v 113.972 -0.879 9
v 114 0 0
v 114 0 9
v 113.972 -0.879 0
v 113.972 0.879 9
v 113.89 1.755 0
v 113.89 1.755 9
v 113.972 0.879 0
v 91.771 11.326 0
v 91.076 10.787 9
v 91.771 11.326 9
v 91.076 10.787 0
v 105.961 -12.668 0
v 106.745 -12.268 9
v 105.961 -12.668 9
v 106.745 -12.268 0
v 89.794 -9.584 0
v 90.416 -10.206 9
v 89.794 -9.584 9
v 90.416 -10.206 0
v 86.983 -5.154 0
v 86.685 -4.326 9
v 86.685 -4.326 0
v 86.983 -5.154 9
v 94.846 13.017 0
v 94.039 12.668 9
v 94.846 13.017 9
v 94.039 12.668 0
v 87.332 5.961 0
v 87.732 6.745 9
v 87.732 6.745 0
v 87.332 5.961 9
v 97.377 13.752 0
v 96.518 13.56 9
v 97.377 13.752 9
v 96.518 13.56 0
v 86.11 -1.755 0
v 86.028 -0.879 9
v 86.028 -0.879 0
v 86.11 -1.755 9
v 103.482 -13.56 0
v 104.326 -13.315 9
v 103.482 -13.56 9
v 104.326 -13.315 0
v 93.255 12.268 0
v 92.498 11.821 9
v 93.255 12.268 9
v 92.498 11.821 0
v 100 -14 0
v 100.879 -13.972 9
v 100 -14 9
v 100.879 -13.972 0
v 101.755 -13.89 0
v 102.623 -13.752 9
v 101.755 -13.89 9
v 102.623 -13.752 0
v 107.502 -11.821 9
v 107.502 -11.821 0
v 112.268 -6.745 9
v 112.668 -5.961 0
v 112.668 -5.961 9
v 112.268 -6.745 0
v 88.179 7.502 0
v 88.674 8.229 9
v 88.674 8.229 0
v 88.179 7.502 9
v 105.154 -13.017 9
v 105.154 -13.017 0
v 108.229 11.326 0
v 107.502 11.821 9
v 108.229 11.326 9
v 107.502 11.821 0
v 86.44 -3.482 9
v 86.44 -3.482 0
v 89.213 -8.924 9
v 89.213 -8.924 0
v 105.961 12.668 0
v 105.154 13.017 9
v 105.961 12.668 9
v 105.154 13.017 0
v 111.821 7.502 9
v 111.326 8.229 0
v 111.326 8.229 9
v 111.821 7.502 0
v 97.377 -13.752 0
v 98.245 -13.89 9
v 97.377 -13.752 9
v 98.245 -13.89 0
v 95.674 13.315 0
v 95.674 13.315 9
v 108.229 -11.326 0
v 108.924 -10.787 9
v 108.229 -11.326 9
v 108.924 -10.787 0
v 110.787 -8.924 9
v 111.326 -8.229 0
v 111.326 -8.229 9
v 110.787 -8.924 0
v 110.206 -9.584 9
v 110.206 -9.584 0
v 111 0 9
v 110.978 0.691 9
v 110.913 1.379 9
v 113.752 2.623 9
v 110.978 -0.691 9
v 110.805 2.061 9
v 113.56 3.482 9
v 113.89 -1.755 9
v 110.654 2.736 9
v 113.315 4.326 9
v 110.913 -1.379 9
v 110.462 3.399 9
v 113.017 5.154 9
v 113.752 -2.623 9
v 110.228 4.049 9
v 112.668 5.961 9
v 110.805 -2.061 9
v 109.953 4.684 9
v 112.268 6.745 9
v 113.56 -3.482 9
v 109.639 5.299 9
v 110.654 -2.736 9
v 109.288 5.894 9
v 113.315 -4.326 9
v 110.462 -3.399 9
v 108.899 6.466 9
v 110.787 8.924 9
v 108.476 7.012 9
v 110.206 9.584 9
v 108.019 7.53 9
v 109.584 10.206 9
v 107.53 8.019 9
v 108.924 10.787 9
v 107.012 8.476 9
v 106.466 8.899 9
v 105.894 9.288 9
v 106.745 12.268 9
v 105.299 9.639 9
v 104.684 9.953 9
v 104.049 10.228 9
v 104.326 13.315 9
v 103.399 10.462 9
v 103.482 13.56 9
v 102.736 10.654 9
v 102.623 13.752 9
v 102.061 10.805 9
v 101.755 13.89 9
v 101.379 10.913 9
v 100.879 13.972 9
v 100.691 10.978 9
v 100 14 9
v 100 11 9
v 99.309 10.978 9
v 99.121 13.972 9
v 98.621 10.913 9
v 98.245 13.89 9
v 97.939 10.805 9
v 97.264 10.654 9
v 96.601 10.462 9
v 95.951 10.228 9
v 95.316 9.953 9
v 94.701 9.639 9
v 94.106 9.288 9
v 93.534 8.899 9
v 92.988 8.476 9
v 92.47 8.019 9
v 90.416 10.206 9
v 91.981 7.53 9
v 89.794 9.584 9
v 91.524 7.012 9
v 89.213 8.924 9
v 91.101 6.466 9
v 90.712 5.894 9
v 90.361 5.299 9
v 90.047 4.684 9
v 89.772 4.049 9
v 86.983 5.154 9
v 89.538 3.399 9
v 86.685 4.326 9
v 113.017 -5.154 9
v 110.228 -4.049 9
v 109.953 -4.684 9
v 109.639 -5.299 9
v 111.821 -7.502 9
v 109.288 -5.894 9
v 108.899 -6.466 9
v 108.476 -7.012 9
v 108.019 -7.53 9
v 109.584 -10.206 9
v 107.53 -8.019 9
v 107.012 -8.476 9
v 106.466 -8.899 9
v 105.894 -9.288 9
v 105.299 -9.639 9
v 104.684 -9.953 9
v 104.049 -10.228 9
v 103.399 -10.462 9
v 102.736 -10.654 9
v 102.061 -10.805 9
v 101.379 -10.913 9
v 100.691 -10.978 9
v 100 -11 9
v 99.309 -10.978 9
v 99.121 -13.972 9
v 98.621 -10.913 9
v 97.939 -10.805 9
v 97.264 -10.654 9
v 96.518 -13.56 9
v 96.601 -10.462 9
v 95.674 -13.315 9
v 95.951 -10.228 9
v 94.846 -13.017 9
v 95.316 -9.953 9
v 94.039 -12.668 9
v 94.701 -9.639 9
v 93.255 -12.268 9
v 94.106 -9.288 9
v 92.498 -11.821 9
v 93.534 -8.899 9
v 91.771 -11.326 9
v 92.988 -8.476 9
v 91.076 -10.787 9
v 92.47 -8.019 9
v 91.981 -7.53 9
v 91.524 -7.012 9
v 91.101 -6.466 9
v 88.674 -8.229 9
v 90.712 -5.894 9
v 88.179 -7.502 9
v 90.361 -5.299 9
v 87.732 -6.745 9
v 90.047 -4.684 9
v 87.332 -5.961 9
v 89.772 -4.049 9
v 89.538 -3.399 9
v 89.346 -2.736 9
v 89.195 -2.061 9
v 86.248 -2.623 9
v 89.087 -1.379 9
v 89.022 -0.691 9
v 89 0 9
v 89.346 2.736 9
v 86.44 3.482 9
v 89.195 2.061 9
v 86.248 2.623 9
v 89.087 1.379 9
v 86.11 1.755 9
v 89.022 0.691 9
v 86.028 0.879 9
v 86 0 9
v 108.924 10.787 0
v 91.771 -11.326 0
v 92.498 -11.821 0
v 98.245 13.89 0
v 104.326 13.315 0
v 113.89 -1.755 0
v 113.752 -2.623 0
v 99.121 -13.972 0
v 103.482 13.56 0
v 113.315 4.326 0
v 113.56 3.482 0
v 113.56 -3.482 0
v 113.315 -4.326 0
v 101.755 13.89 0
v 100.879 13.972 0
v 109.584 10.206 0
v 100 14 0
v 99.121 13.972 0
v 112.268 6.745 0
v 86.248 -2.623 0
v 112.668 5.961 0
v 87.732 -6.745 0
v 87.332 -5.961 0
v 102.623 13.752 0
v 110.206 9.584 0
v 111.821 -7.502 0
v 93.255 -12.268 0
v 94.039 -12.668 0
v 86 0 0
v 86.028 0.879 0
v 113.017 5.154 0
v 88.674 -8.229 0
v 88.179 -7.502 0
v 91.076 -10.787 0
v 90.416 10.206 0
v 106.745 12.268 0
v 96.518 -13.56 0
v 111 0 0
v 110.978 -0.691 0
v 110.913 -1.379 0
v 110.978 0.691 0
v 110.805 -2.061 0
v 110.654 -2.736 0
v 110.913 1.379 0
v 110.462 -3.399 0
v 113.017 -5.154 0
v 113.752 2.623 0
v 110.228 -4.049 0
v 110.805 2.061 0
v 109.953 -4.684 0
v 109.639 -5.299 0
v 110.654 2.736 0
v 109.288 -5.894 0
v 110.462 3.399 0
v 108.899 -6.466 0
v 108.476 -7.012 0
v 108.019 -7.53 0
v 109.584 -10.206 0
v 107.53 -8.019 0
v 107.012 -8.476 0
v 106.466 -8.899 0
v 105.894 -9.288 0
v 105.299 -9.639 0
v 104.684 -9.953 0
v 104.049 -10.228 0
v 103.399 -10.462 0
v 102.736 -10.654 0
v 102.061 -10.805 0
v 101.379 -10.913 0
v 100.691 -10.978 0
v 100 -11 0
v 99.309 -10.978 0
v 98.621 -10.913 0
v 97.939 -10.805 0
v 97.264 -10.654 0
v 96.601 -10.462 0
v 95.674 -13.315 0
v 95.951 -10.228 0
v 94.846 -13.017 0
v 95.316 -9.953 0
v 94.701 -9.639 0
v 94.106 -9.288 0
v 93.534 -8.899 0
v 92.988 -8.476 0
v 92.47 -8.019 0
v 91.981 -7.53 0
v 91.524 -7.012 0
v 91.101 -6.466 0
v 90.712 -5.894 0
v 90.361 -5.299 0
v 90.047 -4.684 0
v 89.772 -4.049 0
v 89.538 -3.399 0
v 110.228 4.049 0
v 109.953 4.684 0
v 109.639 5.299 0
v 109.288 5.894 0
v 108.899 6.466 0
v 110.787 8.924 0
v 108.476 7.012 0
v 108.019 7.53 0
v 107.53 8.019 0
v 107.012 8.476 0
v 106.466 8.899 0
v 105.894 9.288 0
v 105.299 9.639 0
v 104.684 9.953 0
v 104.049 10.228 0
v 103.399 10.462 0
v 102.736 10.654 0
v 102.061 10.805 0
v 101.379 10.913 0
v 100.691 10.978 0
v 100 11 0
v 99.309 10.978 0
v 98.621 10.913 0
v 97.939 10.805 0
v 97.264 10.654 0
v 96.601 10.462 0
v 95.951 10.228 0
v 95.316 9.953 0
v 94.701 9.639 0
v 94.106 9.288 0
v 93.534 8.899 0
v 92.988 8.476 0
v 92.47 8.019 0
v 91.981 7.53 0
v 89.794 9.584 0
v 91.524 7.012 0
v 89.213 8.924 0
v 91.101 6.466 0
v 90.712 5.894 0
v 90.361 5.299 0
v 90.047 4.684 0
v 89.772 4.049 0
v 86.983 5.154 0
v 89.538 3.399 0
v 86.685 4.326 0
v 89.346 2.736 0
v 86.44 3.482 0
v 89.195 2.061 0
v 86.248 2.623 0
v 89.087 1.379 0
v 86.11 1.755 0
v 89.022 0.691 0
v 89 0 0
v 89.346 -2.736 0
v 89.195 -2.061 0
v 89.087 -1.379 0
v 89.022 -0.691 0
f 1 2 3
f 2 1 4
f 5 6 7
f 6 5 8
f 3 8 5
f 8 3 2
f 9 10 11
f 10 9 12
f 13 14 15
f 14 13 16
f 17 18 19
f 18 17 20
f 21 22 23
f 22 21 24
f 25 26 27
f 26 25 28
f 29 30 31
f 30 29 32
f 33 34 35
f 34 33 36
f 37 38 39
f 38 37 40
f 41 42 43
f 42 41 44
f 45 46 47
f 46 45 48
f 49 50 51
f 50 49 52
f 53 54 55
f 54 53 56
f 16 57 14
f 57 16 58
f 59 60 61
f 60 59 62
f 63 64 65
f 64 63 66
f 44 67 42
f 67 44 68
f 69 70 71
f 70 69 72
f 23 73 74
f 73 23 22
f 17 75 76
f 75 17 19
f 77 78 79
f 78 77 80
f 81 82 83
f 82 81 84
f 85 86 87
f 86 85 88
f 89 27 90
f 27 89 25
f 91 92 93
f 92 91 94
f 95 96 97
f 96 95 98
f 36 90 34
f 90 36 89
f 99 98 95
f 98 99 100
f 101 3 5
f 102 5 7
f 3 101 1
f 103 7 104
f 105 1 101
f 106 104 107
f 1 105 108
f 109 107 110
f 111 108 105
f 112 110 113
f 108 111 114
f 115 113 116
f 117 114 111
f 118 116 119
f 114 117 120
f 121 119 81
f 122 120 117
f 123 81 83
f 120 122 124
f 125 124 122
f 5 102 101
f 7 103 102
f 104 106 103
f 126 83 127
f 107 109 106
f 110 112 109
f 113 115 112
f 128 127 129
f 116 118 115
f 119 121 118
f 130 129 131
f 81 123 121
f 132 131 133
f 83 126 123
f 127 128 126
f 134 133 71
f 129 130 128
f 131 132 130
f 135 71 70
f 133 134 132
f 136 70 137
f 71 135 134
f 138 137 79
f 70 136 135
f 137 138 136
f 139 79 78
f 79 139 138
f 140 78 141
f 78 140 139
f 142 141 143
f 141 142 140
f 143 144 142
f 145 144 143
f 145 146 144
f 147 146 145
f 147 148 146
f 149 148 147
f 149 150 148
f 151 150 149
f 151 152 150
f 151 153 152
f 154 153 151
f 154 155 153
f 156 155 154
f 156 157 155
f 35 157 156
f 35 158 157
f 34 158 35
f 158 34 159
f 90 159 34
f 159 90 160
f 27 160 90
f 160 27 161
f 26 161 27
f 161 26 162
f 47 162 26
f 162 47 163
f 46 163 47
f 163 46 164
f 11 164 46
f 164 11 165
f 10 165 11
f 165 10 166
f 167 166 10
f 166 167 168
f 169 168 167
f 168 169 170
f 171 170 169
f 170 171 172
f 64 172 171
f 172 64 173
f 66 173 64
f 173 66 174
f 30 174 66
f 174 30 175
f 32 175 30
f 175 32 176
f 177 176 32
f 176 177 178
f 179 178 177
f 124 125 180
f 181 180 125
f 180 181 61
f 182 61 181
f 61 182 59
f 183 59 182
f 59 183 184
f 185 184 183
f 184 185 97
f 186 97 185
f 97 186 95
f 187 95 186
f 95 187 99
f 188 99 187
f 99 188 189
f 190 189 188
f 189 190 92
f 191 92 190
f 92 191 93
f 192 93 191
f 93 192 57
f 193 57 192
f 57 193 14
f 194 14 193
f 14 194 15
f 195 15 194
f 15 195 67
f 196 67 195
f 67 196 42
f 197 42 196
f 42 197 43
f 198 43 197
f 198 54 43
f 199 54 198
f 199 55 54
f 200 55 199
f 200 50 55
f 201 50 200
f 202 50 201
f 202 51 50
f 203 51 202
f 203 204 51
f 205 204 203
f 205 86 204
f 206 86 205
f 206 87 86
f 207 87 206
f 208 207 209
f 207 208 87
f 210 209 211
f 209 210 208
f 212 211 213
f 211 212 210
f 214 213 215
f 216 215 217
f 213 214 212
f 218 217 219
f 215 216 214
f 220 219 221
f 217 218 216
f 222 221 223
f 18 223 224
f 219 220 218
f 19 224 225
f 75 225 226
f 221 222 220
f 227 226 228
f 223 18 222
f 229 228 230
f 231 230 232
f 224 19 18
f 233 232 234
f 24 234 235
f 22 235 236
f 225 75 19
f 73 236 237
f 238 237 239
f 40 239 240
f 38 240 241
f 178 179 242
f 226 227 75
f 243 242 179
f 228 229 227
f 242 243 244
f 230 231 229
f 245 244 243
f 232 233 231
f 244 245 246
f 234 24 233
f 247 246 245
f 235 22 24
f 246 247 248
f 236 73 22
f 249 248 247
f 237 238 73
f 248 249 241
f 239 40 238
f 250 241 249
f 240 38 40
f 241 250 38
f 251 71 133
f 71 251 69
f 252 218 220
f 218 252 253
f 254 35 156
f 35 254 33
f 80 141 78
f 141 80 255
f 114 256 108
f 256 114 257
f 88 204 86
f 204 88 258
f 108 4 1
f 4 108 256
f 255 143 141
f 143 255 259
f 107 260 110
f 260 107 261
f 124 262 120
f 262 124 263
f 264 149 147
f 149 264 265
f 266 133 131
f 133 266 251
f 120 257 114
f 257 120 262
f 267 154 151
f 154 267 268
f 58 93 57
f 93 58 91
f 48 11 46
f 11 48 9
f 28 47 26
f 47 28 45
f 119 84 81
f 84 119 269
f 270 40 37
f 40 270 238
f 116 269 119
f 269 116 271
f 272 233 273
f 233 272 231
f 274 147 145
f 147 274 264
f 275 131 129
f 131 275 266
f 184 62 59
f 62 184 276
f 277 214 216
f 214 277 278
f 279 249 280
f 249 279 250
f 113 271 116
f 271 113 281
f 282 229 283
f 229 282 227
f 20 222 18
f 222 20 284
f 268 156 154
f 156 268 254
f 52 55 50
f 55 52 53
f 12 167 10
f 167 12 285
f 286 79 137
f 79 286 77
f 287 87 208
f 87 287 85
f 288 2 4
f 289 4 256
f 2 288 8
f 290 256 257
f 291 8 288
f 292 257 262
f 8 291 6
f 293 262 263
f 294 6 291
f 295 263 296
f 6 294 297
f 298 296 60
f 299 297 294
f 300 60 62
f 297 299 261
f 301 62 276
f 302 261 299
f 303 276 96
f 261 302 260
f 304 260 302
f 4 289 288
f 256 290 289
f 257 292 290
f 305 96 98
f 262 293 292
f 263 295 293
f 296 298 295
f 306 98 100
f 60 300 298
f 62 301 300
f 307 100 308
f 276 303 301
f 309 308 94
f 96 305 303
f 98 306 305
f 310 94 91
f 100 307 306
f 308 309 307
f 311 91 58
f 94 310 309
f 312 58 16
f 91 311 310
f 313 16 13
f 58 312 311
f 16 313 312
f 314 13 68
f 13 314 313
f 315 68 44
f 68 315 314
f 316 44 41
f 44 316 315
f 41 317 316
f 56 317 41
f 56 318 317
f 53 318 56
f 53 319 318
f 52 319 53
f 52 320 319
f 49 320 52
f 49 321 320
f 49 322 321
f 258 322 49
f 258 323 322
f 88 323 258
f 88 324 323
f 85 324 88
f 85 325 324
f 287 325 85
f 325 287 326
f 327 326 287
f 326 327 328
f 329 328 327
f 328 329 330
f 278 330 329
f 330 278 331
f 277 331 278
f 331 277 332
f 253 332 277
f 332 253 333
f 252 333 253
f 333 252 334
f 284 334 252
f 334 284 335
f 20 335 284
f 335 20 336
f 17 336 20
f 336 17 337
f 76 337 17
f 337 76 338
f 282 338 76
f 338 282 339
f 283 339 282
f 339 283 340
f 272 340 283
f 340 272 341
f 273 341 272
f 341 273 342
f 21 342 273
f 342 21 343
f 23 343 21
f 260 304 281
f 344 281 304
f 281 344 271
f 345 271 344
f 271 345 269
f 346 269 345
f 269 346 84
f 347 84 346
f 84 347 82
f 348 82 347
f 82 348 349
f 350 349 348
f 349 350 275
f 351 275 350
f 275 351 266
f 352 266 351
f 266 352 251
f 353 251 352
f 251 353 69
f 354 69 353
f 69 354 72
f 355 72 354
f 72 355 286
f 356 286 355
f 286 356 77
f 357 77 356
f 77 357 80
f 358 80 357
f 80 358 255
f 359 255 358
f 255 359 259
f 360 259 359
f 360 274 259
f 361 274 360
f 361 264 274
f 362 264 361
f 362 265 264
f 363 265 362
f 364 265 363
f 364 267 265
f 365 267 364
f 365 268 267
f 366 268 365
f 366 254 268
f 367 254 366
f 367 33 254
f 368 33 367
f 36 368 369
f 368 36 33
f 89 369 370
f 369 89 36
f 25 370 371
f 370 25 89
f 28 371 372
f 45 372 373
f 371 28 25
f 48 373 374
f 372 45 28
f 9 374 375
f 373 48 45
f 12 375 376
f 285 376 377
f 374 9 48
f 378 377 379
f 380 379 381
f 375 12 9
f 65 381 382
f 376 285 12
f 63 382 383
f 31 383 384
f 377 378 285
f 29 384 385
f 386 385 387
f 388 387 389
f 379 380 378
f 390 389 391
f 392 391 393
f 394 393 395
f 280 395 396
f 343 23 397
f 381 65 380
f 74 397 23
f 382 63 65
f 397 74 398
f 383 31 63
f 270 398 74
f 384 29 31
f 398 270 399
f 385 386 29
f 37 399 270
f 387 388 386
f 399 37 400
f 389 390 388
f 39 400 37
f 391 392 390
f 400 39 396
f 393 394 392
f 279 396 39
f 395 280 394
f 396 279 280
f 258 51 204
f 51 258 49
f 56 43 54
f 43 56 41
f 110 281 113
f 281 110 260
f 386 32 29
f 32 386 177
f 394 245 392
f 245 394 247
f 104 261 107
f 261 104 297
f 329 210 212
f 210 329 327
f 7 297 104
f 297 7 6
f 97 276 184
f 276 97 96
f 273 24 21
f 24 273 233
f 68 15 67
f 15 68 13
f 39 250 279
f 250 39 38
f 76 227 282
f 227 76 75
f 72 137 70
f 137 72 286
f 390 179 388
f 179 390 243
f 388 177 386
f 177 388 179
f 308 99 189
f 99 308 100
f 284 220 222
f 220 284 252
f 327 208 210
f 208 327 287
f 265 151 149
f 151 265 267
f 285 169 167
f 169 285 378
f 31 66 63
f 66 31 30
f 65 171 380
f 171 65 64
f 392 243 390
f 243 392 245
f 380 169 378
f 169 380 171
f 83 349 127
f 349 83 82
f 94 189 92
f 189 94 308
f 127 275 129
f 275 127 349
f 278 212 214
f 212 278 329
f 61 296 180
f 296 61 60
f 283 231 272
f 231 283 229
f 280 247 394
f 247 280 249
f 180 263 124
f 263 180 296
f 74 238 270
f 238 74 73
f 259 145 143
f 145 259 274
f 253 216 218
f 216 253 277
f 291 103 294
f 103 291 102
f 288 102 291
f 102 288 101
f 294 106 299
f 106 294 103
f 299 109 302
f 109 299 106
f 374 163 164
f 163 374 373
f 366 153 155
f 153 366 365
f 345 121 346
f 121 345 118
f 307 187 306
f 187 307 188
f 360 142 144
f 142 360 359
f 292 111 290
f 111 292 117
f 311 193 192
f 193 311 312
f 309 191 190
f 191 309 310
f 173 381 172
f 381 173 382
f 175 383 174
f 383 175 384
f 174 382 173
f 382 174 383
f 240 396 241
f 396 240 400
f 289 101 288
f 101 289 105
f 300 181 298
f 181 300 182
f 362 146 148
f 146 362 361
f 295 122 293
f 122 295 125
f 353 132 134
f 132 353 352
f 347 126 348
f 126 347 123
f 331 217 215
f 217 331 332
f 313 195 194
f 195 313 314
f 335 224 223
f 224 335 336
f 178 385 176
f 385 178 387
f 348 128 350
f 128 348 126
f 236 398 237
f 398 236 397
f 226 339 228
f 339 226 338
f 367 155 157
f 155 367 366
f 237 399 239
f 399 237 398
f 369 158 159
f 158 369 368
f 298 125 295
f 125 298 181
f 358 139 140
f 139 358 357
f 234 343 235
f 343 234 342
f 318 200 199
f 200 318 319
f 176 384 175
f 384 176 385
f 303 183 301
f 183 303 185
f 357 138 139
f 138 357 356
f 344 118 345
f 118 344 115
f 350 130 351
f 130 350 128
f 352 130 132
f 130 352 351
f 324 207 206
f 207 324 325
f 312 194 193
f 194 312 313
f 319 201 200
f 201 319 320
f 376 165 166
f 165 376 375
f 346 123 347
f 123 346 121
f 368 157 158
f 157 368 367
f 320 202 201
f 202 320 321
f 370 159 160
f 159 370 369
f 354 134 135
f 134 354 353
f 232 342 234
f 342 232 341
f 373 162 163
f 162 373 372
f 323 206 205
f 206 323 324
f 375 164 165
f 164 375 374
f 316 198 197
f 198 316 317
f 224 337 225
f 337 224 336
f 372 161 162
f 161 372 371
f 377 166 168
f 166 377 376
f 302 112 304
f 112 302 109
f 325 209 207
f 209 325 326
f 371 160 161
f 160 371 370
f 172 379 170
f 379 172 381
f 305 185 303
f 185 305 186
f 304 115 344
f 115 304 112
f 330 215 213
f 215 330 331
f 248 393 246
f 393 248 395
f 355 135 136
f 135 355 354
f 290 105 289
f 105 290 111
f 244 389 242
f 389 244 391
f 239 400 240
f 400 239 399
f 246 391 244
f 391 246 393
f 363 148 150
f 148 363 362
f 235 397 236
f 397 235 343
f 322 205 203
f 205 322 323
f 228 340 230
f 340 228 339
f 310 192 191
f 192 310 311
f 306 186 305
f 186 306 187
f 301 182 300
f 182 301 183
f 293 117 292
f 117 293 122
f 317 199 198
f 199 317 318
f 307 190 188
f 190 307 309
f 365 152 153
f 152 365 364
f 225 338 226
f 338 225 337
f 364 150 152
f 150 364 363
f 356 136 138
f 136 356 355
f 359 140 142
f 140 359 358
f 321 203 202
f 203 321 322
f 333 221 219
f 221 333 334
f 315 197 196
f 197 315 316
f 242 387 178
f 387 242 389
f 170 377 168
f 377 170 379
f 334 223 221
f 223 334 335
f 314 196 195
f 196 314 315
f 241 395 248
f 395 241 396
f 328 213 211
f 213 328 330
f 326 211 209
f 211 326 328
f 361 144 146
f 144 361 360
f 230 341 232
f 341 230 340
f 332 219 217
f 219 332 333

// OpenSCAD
$fn = 100;

//difference() {
//  union() {
//    cylinder(5, 30, 30);
//    
//    cylinder(15, 14, 14);
//
//    difference() {
//      cylinder(15, 25, 25);
//      
//      cylinder(17, 20, 20);
//    }
//  }
//  
//  translate([0, 0, -1])
//    cylinder(20, 11, 11);
//}


translate([100, 0, 0])
  difference() {
    cylinder(9, 14, 14);
    
    cylinder(17, 11, 11);
  }

//translate([200, 0, 0])
//  difference() {
//    cylinder(33, 14, 14);
//    
//    cylinder(55, 11, 11);
//  }
